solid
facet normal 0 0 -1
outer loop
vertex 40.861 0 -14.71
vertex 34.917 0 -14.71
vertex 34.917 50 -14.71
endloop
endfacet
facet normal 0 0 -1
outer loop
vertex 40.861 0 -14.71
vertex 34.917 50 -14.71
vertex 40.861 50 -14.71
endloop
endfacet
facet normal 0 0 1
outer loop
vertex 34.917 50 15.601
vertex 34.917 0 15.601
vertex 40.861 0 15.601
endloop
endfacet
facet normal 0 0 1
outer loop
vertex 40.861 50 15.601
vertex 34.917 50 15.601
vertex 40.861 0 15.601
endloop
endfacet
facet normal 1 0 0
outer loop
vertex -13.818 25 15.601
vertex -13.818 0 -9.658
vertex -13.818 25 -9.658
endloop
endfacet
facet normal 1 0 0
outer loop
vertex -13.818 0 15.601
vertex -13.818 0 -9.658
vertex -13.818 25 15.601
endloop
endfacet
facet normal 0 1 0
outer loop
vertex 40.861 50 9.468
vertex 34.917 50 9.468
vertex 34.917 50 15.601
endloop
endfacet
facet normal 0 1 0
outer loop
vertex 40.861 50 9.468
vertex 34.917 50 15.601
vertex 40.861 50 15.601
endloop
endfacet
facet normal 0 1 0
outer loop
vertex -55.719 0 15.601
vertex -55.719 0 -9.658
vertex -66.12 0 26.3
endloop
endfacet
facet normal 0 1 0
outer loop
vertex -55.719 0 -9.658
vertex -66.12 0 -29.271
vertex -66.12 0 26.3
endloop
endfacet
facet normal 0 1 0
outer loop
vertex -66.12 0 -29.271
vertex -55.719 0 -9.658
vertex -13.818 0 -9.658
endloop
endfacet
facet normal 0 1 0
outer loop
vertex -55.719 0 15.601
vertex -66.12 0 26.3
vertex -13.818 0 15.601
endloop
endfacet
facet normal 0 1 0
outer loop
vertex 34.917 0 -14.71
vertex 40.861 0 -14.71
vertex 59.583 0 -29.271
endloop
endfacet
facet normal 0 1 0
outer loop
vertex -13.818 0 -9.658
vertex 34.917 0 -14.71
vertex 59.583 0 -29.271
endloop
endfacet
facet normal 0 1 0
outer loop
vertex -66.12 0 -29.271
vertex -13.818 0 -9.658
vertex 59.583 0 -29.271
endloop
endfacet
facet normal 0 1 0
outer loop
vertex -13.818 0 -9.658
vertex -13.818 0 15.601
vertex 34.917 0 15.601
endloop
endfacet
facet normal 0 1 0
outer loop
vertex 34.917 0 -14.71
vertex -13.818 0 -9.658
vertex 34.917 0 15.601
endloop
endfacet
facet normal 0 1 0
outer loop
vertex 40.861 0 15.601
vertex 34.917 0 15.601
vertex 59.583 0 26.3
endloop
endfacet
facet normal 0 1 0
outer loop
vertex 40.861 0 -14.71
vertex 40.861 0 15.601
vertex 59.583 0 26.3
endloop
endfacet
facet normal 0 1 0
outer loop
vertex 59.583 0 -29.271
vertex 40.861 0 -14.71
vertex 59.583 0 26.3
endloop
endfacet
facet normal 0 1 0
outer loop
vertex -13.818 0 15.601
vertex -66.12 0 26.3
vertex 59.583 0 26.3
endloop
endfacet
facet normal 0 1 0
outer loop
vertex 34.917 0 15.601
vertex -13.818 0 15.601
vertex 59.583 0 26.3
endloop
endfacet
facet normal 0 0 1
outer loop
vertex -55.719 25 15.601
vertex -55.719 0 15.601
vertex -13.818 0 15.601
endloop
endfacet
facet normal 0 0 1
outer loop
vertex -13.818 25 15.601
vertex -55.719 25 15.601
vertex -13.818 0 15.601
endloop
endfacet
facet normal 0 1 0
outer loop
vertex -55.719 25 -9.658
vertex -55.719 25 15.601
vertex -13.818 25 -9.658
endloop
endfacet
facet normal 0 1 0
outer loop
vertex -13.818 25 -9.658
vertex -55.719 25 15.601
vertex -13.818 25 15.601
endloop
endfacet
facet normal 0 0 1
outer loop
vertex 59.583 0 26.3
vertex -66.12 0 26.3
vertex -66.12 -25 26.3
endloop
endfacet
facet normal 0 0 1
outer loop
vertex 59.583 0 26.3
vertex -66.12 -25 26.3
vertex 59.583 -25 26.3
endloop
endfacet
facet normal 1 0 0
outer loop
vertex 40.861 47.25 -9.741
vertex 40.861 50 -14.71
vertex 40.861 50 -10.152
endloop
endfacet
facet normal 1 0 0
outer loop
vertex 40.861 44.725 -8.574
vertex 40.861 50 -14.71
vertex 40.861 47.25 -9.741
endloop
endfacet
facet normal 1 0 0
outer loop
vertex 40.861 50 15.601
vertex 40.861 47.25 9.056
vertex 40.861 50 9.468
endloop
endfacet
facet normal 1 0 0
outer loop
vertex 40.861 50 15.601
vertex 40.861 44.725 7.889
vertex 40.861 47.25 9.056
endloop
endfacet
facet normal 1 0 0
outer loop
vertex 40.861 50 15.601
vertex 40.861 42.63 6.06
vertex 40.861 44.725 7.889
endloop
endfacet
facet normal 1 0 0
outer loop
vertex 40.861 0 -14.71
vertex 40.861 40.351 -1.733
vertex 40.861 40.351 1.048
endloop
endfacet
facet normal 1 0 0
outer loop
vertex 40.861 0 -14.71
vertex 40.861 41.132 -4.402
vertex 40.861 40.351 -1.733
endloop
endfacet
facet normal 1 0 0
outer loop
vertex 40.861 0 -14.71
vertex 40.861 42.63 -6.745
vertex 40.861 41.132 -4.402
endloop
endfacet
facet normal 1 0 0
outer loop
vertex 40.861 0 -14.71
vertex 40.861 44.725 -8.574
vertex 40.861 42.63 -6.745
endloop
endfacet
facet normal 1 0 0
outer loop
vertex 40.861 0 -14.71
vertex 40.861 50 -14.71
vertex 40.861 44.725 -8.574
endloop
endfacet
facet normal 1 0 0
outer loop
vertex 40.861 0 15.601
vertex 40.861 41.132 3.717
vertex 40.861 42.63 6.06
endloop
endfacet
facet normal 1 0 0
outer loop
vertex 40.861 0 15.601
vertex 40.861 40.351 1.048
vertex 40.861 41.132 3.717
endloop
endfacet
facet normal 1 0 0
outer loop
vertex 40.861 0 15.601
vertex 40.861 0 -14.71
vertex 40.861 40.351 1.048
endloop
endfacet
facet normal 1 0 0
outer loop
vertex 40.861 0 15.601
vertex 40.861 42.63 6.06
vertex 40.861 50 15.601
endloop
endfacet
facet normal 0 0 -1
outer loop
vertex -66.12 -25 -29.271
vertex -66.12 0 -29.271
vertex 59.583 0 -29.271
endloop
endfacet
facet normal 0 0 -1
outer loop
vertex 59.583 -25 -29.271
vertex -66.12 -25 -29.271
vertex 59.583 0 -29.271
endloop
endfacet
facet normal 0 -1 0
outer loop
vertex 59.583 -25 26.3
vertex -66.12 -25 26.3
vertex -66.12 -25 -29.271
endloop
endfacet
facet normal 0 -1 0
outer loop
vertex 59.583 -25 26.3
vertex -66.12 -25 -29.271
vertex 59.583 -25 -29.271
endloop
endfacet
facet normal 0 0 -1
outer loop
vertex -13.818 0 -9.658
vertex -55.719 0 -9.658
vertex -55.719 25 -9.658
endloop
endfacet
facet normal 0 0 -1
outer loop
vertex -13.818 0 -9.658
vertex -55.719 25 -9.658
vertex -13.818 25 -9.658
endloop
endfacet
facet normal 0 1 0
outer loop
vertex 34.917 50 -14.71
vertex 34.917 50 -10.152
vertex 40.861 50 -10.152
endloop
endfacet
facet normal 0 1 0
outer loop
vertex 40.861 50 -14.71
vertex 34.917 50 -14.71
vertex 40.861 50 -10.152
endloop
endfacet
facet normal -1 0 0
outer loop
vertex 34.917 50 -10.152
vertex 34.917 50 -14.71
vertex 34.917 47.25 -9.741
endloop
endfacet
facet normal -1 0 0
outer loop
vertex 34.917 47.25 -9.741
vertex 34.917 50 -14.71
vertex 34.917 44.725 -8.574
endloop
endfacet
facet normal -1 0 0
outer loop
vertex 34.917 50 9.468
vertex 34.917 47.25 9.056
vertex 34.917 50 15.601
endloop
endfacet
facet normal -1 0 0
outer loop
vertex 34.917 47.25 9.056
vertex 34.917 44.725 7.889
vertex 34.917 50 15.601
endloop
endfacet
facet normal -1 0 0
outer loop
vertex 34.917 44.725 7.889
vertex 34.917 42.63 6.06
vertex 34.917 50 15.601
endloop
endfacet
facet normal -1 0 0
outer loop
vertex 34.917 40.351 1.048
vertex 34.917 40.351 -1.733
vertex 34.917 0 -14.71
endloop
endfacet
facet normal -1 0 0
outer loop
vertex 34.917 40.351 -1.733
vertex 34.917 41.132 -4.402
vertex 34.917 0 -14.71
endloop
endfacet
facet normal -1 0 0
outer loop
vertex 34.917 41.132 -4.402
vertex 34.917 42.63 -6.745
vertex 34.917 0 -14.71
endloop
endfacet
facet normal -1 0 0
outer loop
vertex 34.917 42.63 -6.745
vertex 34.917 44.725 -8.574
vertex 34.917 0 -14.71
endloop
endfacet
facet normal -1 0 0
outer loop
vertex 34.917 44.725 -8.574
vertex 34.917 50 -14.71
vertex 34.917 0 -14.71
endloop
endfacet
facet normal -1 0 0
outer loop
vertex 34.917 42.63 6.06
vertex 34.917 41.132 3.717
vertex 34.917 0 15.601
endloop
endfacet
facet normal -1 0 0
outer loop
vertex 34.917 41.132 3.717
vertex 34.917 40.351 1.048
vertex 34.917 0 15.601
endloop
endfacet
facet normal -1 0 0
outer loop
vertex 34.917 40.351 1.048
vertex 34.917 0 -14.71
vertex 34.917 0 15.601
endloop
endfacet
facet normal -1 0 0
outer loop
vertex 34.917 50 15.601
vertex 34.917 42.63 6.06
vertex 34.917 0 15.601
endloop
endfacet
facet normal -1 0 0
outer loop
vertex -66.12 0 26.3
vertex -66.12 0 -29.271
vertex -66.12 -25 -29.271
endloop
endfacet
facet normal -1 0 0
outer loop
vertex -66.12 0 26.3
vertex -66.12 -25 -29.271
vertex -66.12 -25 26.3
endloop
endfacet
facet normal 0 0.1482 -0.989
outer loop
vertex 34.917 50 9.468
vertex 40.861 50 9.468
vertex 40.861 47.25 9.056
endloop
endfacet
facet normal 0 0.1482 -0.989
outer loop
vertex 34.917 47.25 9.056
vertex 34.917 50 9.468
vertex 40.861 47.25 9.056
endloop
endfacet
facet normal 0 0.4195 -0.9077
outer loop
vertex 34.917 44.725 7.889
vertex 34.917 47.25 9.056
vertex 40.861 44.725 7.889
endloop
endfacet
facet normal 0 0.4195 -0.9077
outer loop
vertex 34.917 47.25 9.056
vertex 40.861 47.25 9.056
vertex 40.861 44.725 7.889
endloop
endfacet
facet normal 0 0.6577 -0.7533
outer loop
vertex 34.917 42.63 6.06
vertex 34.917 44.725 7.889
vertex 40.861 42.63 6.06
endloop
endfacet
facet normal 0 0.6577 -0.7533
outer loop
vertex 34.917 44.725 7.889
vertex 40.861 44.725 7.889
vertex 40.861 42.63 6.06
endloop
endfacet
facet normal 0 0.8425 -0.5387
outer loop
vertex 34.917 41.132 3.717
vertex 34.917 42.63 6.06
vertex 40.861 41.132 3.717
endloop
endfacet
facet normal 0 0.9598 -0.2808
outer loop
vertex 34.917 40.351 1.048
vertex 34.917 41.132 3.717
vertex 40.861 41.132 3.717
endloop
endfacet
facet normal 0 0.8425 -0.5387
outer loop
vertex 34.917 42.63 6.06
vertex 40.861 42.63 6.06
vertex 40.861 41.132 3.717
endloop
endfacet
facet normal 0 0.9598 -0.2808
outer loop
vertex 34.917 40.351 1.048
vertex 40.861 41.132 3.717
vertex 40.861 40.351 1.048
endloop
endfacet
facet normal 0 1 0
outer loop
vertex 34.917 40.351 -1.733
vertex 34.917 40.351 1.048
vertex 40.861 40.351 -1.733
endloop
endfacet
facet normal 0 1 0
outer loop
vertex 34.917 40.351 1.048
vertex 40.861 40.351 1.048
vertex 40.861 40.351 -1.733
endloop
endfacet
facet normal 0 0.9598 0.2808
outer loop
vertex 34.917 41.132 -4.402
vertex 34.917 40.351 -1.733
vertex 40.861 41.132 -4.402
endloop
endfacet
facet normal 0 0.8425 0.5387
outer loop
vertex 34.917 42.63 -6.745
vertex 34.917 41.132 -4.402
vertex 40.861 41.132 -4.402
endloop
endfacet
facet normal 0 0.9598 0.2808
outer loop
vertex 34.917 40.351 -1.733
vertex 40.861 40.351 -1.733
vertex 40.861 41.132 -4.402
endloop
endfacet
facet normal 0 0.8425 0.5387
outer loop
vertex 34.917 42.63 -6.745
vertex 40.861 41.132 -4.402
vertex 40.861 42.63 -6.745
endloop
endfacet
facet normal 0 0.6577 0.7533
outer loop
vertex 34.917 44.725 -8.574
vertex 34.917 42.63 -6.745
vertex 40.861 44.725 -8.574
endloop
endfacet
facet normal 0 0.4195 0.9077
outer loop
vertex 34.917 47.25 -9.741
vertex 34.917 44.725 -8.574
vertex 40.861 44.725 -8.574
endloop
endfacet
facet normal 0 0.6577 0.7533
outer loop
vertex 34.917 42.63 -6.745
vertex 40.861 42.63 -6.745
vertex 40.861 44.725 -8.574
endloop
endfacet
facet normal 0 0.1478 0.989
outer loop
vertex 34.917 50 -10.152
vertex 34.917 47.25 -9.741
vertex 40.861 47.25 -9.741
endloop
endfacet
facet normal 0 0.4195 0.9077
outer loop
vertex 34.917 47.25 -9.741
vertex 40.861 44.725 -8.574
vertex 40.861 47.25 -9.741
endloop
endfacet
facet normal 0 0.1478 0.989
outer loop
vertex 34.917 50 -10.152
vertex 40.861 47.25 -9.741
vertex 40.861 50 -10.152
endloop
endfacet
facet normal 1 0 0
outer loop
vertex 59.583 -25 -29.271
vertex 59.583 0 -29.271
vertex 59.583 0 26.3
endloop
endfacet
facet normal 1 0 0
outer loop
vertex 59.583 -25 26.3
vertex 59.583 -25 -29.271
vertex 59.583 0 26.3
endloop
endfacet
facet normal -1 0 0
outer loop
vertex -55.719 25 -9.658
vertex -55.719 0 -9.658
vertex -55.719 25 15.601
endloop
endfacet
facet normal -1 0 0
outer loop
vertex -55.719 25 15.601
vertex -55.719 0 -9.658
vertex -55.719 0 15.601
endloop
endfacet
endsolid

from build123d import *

# Parameters (mm, degrees)
F0_W          = 41.900944
F0_H          = 25.259434
F0_W_2        = 5.943396
F0_H_2        = 30.311321
F0_W_3        = 125.702835
F0_H_3        = 55.570757
F1_DEPTH      = 25
F2_DEPTH      = 25
F2_DEPTH_BACK = 25
F3_DEPTH      = 25
F3_DEPTH_BACK = 50
F5_DEPTH      = 106.982136


with BuildPart() as f1:
    # F0 (on Front) → F1 (new body)
    with BuildSketch(Plane.XZ):
        with Locations((-34.76887, 2.971698)):
            Rectangle(F0_W, F0_H)
        with Locations((37.889149, 0.445754)):
            Rectangle(F0_W_2, F0_H_2)
        with Locations((-3.268871, -1.485849)):
            Rectangle(F0_W_3, F0_H_3)
        with Locations((-34.76887, 2.971698)):
            Rectangle(F0_W, F0_H, mode=Mode.SUBTRACT)
        with Locations((37.889149, 0.445754)):
            Rectangle(F0_W_2, F0_H_2, mode=Mode.SUBTRACT)
    extrude(amount=F1_DEPTH)

    # F0 (on Front) → F2 (join, two sides)
    with BuildSketch(Plane.XZ) as f2_sk:
        with Locations((-34.76887, 2.971698)):
            Rectangle(F0_W, F0_H)
    extrude(amount=F2_DEPTH)
    extrude(f2_sk.sketch, amount=-F2_DEPTH_BACK)

    # F0 (on Front) → F3 (join, two sides)
    with BuildSketch(Plane.XZ) as f3_sk:
        with Locations((37.889149, 0.445754)):
            Rectangle(F0_W_2, F0_H_2)
    extrude(amount=F3_DEPTH)
    extrude(f3_sk.sketch, amount=-F3_DEPTH_BACK)

    # F4 (on face) → F5 (cut, through all)
    with BuildSketch(Plane.YZ.offset(40.860847)):
        with BuildLine():
            Line((50, -10.152427), (50, 9.467568))
            ThreePointArc((50, 9.467568), (40.252312, -0.34243), (50, -10.152427))
        make_face()
    extrude(amount=-F5_DEPTH, mode=Mode.SUBTRACT)


solid = f1.part
